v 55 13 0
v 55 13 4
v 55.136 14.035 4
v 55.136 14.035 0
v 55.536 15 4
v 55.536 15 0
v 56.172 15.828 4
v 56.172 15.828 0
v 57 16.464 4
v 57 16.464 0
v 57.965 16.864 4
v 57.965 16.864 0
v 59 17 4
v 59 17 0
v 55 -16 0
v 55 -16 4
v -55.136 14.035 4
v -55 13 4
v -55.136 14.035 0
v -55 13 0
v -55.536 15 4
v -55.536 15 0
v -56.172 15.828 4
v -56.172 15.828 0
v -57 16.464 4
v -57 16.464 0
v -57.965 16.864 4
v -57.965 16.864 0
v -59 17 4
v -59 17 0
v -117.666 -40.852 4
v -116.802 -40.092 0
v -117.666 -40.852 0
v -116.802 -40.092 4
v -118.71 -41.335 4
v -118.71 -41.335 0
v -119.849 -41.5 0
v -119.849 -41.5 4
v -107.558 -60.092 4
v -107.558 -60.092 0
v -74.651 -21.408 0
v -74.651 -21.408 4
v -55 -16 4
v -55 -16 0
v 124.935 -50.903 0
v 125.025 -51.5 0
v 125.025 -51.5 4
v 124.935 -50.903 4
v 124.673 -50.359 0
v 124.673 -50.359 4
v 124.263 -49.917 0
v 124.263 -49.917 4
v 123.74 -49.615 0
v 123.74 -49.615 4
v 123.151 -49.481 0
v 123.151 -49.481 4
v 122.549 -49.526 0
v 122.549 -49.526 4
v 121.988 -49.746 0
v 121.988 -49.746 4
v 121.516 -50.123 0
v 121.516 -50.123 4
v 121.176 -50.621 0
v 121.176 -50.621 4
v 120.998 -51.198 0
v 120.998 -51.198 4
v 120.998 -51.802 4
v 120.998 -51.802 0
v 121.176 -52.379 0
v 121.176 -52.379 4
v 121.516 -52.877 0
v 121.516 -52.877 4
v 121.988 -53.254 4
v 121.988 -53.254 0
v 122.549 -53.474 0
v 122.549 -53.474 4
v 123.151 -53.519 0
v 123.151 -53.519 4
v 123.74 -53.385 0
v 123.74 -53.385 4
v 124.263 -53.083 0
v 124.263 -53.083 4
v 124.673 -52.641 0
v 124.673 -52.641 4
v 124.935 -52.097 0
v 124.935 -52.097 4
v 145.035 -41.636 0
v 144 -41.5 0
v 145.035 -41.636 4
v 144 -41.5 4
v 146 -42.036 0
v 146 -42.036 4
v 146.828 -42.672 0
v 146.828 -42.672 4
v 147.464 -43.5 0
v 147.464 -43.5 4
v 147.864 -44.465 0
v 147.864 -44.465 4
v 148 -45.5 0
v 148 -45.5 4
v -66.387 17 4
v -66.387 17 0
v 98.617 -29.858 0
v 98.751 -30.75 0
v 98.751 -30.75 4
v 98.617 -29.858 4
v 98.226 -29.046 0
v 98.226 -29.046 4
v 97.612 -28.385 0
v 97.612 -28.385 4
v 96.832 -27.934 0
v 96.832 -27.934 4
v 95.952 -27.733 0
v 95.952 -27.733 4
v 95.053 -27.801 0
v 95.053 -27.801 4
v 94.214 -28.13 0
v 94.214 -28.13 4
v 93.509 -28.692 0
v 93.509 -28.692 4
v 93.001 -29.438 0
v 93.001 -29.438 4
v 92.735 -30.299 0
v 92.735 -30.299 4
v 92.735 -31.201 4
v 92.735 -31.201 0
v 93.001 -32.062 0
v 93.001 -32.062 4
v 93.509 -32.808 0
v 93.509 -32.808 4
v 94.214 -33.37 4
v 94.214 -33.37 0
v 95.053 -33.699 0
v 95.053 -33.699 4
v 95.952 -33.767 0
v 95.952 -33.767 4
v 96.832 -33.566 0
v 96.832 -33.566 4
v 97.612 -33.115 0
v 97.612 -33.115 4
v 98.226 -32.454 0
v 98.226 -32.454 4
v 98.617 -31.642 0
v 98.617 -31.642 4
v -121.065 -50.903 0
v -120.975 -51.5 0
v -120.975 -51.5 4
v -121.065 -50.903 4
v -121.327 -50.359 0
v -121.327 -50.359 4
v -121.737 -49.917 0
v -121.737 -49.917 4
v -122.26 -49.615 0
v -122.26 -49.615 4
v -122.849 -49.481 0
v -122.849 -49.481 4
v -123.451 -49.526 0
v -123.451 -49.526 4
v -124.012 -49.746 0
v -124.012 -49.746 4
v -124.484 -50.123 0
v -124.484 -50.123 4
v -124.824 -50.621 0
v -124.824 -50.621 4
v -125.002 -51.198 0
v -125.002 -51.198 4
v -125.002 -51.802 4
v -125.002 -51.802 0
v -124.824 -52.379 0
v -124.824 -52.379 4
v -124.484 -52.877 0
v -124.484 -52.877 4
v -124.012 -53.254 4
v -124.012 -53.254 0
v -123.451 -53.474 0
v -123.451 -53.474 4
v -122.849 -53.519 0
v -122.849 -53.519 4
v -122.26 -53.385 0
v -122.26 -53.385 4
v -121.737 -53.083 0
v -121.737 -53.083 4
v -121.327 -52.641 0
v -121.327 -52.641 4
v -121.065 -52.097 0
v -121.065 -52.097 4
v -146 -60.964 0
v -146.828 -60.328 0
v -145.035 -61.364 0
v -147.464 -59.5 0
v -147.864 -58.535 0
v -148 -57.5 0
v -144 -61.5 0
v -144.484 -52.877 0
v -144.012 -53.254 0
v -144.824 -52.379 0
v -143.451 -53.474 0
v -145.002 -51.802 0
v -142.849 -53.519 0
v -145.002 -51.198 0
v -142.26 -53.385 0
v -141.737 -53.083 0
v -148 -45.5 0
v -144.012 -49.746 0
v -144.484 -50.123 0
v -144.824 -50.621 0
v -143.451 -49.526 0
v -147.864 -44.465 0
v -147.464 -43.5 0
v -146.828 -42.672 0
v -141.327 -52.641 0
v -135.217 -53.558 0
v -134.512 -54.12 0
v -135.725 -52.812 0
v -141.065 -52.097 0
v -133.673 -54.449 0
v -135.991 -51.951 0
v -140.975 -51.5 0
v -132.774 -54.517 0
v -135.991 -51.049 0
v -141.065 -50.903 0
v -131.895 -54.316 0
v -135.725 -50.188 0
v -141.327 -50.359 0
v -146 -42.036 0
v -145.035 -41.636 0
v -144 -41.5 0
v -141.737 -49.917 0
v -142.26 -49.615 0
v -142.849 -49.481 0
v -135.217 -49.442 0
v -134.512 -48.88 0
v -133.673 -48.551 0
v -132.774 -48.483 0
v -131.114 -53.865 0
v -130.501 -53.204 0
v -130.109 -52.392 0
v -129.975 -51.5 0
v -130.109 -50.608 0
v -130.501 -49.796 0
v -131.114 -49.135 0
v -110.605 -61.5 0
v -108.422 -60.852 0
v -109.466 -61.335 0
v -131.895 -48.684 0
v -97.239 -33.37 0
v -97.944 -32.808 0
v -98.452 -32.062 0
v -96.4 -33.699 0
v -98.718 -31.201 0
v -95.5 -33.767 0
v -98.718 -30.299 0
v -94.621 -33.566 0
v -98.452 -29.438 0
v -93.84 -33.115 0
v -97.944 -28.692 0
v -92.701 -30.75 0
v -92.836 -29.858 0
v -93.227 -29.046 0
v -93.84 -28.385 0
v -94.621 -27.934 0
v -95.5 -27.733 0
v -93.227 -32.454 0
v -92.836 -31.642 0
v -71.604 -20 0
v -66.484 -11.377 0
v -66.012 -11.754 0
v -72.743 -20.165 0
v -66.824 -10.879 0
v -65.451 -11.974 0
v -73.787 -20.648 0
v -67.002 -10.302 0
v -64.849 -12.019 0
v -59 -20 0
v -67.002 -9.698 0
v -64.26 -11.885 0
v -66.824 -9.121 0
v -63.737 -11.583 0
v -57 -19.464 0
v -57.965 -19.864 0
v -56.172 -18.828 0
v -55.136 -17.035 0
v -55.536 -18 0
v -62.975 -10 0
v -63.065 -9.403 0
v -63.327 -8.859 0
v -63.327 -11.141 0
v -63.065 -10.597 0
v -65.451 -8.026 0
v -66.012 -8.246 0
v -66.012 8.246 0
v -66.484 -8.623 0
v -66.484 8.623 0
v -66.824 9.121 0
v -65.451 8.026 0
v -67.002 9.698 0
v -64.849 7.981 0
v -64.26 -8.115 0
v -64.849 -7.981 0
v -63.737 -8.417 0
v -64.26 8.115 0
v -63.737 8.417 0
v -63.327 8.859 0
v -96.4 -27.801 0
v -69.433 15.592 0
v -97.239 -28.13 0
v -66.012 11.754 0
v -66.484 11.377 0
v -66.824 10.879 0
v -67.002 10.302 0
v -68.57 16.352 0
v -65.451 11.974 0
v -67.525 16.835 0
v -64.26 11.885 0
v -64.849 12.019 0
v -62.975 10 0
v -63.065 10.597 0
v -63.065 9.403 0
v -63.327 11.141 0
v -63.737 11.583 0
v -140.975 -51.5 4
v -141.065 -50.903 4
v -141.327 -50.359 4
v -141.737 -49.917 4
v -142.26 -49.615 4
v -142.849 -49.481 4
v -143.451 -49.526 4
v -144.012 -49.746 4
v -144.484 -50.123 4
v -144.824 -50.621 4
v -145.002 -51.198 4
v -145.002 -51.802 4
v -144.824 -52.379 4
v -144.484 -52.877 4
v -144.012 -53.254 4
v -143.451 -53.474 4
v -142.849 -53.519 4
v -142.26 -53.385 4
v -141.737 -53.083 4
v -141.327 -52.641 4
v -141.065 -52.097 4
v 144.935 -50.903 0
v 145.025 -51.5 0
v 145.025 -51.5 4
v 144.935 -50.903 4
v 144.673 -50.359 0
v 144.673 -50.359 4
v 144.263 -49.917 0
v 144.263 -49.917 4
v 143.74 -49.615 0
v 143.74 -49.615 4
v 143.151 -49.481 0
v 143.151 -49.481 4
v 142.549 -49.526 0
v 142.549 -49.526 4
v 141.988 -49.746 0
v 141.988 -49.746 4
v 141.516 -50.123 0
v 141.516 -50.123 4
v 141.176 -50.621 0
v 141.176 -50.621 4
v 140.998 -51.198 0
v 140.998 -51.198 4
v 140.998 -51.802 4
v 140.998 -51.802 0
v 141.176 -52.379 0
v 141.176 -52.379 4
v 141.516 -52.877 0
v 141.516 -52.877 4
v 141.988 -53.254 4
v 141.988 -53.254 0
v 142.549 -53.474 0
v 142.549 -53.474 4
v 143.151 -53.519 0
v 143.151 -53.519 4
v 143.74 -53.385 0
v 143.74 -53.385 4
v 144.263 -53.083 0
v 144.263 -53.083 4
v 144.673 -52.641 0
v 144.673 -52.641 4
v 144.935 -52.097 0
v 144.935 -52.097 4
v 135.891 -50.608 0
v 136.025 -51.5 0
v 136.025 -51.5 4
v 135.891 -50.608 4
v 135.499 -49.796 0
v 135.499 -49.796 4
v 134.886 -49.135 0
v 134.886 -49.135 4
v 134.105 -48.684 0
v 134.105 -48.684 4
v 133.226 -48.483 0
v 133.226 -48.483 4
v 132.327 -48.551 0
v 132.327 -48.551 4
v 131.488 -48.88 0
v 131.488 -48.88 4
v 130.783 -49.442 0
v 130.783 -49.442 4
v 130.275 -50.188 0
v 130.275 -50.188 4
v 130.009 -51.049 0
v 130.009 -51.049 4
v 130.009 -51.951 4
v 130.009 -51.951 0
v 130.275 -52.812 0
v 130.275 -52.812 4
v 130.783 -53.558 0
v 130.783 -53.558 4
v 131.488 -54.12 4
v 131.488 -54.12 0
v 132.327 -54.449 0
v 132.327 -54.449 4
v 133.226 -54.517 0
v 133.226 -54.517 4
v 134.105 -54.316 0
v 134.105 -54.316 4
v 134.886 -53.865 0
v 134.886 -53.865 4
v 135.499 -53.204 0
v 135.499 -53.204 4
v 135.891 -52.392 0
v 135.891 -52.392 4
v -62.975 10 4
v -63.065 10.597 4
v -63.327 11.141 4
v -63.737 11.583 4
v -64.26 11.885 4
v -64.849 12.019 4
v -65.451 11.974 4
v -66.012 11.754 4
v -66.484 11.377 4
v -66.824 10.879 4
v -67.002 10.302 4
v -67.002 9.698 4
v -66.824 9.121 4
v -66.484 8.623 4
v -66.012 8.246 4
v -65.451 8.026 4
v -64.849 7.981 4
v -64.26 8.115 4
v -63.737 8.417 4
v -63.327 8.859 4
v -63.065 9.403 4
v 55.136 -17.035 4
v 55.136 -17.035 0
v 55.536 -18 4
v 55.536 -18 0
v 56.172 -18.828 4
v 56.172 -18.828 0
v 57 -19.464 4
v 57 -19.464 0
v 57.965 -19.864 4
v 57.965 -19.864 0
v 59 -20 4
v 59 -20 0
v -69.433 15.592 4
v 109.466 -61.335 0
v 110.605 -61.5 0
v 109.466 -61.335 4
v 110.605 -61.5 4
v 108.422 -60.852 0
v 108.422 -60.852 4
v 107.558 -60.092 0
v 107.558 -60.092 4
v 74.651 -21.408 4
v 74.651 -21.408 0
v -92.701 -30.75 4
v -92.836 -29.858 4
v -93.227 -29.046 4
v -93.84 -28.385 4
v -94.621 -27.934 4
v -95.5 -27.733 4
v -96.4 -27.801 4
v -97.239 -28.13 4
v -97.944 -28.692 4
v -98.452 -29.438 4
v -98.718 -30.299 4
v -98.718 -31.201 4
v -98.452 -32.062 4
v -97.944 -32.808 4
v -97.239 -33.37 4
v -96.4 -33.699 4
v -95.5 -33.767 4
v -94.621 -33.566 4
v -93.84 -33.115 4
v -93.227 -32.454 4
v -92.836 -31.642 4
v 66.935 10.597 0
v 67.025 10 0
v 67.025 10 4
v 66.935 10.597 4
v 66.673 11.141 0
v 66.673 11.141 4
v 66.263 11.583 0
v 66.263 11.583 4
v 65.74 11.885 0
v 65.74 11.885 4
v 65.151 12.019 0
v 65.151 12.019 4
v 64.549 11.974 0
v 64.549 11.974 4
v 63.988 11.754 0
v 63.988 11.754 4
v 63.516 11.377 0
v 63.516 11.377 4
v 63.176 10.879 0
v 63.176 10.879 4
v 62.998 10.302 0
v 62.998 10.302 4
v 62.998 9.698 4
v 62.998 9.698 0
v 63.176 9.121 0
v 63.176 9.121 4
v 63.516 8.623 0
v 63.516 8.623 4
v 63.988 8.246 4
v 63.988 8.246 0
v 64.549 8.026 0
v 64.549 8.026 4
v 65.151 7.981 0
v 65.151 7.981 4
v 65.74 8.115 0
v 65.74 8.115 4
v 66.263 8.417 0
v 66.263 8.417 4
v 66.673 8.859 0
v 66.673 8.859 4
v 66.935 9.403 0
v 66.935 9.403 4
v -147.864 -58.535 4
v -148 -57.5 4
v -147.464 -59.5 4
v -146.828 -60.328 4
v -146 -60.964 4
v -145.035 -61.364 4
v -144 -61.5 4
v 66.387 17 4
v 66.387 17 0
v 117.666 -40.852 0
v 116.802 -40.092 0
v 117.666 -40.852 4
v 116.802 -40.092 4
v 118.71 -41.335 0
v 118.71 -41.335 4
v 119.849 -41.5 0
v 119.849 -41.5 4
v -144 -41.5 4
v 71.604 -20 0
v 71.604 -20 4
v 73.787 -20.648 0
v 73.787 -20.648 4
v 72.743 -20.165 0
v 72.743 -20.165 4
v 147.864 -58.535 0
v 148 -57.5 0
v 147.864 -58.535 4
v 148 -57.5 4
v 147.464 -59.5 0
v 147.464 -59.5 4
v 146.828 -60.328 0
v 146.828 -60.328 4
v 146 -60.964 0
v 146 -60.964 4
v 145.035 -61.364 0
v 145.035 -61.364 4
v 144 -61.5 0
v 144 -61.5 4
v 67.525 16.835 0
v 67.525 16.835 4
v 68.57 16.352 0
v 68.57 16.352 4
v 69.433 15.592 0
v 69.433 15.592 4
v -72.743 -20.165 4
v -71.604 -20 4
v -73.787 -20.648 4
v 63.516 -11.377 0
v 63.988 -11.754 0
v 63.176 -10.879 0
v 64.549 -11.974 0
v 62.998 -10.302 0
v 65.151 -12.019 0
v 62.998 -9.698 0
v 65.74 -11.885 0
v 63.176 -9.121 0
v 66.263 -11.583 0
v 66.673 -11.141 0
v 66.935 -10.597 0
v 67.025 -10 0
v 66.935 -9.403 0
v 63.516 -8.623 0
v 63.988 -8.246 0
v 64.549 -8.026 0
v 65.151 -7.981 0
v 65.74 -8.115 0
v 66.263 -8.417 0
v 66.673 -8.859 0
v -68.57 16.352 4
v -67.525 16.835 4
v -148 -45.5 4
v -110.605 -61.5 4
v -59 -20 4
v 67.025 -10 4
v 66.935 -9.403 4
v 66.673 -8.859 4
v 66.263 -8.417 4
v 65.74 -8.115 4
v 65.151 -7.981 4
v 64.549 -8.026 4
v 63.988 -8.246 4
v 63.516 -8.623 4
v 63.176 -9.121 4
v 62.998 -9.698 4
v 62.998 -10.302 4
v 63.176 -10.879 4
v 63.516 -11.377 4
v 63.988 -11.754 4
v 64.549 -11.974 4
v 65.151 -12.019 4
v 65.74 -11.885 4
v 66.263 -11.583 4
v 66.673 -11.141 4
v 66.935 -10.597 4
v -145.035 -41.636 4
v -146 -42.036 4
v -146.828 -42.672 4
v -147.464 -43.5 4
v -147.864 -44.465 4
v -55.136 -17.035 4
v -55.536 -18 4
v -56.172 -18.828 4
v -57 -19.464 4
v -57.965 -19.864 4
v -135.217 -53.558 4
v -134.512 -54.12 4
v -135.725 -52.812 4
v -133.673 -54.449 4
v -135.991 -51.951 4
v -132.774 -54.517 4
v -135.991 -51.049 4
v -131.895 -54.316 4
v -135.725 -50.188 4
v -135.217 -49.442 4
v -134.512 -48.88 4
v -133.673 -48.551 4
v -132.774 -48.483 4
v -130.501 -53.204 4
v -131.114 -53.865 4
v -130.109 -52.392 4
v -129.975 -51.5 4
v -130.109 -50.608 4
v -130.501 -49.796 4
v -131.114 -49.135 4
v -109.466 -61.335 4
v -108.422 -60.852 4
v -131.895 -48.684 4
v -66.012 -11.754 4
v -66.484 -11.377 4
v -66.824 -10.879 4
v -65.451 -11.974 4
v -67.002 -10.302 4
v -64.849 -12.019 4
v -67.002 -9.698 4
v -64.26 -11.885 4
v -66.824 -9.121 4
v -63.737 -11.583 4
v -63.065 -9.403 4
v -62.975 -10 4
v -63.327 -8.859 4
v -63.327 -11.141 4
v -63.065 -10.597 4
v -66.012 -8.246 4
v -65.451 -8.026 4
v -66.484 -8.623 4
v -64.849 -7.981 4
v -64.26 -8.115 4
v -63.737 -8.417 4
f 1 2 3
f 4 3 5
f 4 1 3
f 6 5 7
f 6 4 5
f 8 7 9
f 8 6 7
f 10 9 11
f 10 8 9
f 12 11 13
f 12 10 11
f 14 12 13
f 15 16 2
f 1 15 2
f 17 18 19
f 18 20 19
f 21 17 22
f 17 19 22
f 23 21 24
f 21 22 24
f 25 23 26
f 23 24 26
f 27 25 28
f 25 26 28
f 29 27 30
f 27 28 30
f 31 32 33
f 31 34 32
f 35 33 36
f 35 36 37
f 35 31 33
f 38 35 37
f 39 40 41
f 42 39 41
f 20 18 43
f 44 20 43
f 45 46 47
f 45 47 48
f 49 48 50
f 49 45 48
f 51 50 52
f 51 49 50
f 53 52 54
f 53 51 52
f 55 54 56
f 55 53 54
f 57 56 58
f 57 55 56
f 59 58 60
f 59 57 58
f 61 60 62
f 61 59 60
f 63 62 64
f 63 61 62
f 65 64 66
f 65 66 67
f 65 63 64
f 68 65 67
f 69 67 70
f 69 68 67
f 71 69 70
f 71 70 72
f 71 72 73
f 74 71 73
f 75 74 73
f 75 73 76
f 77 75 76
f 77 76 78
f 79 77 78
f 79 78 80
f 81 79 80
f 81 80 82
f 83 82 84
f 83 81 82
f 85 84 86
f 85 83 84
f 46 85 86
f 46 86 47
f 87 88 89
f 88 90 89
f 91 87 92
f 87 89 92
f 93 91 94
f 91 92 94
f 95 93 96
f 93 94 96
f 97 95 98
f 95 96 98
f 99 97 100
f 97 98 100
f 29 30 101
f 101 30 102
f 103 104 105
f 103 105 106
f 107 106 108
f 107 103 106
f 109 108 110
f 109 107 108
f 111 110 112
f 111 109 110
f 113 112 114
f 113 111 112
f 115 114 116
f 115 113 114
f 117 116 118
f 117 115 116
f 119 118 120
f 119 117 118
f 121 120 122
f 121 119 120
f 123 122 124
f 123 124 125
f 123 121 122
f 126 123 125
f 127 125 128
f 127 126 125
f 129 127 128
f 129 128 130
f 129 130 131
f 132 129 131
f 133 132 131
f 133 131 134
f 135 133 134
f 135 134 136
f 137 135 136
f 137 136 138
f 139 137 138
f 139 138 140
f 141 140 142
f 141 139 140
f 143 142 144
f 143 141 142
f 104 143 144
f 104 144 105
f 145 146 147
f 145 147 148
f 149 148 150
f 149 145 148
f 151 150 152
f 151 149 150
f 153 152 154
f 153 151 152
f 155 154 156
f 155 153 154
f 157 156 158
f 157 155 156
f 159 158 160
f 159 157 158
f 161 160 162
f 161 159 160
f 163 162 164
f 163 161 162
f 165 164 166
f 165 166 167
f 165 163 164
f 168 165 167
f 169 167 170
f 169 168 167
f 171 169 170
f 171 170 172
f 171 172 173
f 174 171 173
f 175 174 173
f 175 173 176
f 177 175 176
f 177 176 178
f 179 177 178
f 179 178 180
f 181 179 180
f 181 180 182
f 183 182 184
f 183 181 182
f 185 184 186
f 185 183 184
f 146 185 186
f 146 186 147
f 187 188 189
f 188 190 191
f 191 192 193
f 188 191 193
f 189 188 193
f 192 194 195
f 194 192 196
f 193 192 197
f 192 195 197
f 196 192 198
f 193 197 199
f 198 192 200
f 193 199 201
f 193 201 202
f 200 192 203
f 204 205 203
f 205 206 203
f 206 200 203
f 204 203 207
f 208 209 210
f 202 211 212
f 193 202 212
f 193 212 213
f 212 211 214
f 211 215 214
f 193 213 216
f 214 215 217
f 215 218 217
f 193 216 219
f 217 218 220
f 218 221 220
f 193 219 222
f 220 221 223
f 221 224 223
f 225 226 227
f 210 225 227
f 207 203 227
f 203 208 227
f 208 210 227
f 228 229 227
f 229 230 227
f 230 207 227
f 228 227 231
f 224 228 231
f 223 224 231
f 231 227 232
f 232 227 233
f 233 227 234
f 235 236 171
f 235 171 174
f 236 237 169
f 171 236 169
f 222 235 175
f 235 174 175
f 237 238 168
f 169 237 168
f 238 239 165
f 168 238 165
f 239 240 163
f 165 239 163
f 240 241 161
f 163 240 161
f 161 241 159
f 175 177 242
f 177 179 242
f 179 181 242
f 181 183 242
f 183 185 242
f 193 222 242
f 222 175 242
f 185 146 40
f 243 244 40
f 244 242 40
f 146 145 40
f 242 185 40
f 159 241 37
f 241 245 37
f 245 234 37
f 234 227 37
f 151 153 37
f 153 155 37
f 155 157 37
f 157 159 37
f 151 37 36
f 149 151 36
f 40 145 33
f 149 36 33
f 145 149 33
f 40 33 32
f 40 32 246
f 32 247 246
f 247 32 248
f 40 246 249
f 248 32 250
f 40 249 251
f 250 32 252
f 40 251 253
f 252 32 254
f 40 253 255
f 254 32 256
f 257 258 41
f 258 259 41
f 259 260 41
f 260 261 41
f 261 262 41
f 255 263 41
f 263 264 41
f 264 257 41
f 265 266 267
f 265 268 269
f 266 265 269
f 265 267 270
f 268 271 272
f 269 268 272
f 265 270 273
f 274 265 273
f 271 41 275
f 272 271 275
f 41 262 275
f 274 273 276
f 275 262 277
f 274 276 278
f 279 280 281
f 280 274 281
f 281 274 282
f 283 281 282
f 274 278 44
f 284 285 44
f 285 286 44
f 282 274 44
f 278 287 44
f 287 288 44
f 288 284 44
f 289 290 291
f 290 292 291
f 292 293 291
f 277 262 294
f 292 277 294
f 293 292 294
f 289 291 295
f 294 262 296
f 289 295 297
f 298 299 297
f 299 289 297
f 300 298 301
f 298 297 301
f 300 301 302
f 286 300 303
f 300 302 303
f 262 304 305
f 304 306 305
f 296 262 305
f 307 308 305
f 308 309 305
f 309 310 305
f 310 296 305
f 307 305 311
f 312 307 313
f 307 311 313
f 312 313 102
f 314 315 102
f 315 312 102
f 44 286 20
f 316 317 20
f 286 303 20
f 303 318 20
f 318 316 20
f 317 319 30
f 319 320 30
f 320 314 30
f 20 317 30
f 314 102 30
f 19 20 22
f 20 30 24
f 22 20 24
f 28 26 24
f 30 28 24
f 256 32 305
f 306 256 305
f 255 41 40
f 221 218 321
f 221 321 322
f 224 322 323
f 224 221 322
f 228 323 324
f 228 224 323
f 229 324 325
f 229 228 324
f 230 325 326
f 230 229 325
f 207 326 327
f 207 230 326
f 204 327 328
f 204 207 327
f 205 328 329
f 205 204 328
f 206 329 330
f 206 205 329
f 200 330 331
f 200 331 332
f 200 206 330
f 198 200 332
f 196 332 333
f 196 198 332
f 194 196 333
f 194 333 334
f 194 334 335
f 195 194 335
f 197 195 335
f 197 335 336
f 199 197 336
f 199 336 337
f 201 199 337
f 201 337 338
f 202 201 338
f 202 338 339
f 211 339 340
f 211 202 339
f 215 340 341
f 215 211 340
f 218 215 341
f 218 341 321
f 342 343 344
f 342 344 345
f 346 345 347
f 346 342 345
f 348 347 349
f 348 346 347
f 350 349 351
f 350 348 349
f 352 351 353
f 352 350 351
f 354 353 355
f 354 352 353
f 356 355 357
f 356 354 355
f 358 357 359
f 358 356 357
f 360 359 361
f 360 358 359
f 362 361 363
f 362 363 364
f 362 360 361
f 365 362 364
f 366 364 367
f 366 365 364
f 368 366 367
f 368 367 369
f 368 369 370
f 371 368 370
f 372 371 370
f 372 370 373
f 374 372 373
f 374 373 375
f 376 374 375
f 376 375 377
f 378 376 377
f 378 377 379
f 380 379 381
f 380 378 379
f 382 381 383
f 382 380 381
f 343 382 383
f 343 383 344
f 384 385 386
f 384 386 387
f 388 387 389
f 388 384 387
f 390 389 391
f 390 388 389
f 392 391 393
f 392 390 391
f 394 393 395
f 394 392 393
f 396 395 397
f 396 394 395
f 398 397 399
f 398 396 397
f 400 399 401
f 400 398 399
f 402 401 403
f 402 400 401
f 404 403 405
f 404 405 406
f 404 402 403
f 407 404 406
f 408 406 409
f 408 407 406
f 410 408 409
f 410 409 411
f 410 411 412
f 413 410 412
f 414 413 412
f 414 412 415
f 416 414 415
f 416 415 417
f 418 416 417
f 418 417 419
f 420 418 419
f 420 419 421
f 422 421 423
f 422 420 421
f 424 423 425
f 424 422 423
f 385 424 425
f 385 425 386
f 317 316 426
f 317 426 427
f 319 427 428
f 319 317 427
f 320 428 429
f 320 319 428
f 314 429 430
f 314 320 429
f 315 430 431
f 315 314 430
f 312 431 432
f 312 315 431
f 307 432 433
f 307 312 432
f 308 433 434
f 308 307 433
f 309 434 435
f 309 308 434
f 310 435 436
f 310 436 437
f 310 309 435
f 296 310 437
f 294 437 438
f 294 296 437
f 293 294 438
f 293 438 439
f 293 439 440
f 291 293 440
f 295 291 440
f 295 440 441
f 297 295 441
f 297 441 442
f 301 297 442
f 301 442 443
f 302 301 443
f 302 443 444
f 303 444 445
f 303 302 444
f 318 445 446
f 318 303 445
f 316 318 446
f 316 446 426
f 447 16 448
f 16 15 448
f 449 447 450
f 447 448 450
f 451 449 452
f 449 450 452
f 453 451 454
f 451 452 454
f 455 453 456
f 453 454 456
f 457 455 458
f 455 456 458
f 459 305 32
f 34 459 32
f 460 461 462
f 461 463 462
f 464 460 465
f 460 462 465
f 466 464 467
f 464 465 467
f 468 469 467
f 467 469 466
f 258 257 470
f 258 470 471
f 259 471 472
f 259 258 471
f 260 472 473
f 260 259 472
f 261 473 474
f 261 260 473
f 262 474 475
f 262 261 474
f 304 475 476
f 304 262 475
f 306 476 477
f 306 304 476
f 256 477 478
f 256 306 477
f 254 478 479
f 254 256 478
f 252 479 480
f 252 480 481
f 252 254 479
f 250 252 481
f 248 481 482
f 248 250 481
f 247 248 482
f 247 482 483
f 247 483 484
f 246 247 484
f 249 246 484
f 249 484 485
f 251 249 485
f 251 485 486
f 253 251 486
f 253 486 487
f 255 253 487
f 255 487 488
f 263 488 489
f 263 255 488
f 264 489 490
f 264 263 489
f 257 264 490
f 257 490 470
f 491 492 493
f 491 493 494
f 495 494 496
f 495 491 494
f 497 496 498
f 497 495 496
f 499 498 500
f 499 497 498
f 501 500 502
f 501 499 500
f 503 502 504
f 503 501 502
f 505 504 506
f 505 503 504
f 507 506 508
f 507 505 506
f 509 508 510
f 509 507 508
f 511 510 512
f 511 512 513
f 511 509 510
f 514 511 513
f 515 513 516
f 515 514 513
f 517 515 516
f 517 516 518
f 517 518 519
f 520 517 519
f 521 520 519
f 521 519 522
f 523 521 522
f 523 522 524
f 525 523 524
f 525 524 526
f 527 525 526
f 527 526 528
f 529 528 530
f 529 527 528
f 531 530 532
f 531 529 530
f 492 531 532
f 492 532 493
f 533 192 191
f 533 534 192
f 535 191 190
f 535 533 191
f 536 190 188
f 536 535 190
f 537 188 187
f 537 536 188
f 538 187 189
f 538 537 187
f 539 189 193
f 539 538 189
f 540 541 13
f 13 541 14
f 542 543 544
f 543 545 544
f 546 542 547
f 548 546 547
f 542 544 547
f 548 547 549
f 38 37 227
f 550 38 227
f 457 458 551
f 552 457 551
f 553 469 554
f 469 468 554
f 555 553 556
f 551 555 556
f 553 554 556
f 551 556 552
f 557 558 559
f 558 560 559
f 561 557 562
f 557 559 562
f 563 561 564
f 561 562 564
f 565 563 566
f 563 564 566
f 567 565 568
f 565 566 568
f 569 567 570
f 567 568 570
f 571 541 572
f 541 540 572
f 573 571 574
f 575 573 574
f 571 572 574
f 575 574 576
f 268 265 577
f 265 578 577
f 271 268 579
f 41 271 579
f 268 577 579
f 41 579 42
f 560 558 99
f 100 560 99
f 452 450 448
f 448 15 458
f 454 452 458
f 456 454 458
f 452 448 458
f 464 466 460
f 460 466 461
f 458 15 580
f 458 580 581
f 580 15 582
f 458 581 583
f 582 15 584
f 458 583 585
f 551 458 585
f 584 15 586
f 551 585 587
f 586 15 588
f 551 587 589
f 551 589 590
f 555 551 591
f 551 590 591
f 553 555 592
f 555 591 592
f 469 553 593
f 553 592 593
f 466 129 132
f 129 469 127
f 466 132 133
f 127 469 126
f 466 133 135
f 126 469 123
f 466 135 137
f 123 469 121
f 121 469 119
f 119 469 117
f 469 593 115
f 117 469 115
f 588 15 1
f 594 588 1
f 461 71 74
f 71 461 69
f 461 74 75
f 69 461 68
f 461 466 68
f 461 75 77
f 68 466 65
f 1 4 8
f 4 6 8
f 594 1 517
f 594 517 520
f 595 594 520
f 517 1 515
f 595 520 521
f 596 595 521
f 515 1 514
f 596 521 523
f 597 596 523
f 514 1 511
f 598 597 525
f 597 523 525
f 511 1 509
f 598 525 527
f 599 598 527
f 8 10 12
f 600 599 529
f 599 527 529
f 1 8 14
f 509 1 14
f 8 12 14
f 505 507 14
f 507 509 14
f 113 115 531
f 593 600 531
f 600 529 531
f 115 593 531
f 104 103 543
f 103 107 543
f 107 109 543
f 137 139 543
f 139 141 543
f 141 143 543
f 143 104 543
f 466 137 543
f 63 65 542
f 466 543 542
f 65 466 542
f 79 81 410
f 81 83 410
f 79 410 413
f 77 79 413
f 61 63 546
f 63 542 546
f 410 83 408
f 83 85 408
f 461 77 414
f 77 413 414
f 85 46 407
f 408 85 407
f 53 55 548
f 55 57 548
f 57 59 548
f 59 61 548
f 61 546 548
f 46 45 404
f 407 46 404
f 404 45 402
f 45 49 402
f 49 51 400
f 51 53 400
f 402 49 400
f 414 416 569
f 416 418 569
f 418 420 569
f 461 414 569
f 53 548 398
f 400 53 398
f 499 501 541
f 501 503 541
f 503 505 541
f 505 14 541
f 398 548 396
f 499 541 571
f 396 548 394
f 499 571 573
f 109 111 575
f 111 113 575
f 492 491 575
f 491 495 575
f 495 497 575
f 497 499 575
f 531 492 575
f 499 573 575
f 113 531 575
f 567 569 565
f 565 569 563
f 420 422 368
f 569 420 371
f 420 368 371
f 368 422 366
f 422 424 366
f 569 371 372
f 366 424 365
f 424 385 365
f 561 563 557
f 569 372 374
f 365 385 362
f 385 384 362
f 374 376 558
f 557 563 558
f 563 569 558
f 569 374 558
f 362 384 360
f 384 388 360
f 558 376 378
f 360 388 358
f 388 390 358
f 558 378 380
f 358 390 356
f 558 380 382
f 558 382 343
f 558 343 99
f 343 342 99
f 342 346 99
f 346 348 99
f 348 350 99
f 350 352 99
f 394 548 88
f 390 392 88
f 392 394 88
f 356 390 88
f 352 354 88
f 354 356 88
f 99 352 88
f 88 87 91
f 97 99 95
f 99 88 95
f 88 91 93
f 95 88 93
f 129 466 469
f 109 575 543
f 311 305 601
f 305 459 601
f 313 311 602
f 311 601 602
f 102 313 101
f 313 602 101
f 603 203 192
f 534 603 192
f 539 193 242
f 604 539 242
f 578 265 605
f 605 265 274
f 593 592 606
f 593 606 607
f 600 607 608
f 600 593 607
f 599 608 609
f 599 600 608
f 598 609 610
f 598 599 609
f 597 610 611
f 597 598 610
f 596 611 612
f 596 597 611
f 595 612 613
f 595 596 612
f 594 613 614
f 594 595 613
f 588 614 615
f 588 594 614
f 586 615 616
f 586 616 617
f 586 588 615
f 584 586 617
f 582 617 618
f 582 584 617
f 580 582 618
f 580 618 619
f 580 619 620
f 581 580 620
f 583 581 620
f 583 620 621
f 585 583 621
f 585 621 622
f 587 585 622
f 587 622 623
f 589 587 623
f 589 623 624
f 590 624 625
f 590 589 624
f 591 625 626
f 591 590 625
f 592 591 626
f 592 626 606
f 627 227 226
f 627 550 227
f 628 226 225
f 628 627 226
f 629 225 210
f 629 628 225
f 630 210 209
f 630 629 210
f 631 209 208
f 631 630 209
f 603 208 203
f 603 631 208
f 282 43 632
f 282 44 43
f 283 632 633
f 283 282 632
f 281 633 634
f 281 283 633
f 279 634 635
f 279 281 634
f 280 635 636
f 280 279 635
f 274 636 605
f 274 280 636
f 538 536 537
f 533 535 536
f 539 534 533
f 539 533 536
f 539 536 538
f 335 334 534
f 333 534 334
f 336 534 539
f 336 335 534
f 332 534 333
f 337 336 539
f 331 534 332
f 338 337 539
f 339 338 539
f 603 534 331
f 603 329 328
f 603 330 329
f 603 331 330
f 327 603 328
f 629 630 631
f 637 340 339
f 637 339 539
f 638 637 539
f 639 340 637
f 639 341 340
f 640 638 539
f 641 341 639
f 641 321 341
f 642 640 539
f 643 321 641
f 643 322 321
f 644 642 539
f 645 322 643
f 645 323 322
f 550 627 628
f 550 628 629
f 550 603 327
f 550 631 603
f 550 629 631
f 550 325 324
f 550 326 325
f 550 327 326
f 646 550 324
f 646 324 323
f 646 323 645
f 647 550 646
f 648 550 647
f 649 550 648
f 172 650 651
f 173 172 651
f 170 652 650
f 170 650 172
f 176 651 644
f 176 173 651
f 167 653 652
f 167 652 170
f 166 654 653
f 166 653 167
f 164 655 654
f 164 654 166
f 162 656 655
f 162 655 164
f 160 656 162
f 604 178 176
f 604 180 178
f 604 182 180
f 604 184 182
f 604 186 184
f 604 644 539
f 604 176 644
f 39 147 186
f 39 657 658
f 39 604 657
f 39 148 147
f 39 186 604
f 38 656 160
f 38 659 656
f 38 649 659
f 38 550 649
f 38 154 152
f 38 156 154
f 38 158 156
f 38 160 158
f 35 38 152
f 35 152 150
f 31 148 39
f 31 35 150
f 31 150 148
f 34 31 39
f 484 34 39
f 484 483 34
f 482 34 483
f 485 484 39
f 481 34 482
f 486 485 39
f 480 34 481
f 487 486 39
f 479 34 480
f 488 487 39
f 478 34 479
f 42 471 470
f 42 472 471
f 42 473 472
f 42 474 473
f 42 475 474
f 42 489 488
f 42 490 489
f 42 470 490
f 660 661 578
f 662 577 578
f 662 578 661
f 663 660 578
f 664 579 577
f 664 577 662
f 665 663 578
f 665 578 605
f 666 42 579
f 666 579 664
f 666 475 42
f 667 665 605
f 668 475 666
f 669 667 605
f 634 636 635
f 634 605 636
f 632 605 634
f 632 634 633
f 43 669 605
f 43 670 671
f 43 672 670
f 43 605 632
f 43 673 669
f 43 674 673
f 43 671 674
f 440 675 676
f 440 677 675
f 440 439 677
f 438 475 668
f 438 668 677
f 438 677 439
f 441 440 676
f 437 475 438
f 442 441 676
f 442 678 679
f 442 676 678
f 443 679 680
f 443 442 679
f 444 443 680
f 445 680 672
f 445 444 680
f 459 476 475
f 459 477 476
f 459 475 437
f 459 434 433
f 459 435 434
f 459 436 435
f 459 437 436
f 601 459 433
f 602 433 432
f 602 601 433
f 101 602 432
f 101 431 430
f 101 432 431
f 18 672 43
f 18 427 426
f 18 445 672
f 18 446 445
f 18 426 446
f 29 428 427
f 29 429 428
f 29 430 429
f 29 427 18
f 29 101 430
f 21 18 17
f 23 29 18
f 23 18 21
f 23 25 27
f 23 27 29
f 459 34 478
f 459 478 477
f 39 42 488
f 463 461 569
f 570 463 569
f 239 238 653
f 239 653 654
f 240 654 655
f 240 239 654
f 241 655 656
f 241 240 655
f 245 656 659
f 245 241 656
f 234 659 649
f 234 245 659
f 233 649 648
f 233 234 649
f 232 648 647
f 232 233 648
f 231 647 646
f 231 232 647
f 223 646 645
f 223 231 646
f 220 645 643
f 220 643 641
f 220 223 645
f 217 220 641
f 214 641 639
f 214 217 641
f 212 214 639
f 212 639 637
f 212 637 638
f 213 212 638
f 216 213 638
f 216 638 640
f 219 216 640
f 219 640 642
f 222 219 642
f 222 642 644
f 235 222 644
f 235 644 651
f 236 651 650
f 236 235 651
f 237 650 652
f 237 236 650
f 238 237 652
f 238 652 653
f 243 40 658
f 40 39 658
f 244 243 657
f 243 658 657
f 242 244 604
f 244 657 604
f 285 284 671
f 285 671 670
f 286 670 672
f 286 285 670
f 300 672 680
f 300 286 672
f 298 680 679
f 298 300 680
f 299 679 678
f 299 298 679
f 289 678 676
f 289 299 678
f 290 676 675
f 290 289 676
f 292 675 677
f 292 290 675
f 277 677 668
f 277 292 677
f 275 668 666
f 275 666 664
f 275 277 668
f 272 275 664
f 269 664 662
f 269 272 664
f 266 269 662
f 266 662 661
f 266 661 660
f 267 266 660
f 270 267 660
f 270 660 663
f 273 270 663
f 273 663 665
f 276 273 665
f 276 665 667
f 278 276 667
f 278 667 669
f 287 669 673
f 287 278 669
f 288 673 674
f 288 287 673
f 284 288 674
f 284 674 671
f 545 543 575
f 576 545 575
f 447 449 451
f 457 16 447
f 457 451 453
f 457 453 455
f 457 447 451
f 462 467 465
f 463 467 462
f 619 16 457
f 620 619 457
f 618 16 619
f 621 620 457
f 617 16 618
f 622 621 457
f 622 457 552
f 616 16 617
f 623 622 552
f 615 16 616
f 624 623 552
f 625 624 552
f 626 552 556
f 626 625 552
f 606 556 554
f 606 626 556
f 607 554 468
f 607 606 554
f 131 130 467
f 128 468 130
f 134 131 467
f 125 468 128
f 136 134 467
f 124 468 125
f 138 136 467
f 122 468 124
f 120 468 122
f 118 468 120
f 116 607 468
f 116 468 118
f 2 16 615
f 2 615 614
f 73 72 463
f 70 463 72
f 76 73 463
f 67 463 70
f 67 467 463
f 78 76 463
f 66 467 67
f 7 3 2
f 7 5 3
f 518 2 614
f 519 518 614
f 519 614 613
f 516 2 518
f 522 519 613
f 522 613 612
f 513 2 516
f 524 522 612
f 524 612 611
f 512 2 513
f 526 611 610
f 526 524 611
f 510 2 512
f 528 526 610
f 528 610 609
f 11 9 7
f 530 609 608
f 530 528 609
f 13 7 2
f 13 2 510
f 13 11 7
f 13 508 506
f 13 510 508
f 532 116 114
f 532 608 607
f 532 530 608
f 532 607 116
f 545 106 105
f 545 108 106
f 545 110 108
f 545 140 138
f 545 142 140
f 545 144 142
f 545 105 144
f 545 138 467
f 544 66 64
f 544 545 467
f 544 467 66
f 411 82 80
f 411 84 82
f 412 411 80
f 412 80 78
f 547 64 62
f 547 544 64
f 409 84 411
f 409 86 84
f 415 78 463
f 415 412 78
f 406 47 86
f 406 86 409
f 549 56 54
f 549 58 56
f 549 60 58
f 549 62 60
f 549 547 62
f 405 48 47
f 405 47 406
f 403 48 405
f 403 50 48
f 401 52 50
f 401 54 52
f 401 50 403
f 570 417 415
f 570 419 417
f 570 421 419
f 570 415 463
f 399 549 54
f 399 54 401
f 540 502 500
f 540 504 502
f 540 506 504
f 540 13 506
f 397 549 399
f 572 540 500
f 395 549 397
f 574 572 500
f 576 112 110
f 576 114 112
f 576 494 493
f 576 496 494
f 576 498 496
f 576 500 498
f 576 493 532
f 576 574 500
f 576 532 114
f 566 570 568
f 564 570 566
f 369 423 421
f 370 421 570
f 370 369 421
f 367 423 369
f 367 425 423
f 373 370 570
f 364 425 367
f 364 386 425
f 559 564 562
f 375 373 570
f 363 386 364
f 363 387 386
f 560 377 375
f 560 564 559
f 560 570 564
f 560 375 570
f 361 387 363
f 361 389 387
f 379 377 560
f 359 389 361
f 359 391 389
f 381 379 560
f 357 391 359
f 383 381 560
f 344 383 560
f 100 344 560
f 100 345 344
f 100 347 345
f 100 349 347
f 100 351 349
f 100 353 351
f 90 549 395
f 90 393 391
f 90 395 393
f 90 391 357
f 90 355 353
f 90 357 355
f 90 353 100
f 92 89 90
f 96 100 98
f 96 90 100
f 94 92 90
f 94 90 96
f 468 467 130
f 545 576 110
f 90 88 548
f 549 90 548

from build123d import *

# Parameters (mm, degrees)
SKETCH_1_R          = 3.025
SKETCH_1_R_2        = 2.025
EXTRUDE_1_DEPTH     = 4
SKETCH_2_W          = 79
SKETCH_2_H          = 36
CUT_EXTRUDE_1_DEPTH = 4
FILLET_1_R          = 4
SKETCH_3_W          = 110
SKETCH_3_H          = 3
SKETCH_3_H_2        = 34
CUT_EXTRUDE_2_DEPTH = 10
FILLET_2_R          = 4
FILLET_3_R          = 4


with BuildPart() as part:
    # 草图1 → 凸台-拉伸1 (new body)
    with BuildSketch(Plane.XY):
        with BuildLine():
            Line((-68.235415063, 17), (-118, -41.5))
            Line((-118, -41.5), (-148, -41.5))
            Line((-148, -41.5), (-148, -61.5))
            Line((-148, -61.5), (-108.755956962, -61.5))
            Line((-108.755956962, -61.5), (-73.45287534, -20))
            Line((-73.45287534, -20), (73.45287534, -20))
            Line((73.45287534, -20), (108.755956962, -61.5))
            Line((108.755956962, -61.5), (148, -61.5))
            Line((148, -61.5), (148, -41.5))
            Line((148, -41.5), (118, -41.5))
            Line((118, -41.5), (68.235415063, 17))
            Line((68.235415063, 17), (49.462300945, 17))
            ThreePointArc((49.462300945, 17), (47.5, 14.475), (45.537699055, 17))
            Line((45.537699055, 17), (-45.537699055, 17))
            ThreePointArc((-45.537699055, 17), (-47.5, 14.475), (-49.462300945, 17))
            Line((-49.462300945, 17), (-68.235415063, 17))
        make_face()
        with Locations((-95.72643767, -30.75)):
            Circle(SKETCH_1_R, mode=Mode.SUBTRACT)
        with Locations((95.72643767, -30.75)):
            Circle(SKETCH_1_R, mode=Mode.SUBTRACT)
        with Locations((-65, -10)):
            Circle(SKETCH_1_R_2, mode=Mode.SUBTRACT)
        with Locations((-47.5, -8.5)):
            Circle(SKETCH_1_R_2, mode=Mode.SUBTRACT)
        with Locations((-65, 10)):
            Circle(SKETCH_1_R_2, mode=Mode.SUBTRACT)
        with Locations((47.5, -8.5)):
            Circle(SKETCH_1_R_2, mode=Mode.SUBTRACT)
        with Locations((65, -10)):
            Circle(SKETCH_1_R_2, mode=Mode.SUBTRACT)
        with Locations((65, 10)):
            Circle(SKETCH_1_R_2, mode=Mode.SUBTRACT)
        with Locations((-123, -51.5)):
            Circle(SKETCH_1_R_2, mode=Mode.SUBTRACT)
        with Locations((-143, -51.5)):
            Circle(SKETCH_1_R_2, mode=Mode.SUBTRACT)
        with Locations((-133, -51.5)):
            Circle(SKETCH_1_R, mode=Mode.SUBTRACT)
        with Locations((143, -51.5)):
            Circle(SKETCH_1_R_2, mode=Mode.SUBTRACT)
        with Locations((123, -51.5)):
            Circle(SKETCH_1_R_2, mode=Mode.SUBTRACT)
        with Locations((133, -51.5)):
            Circle(SKETCH_1_R, mode=Mode.SUBTRACT)
    extrude(amount=EXTRUDE_1_DEPTH)

    # 草图2 → 切除-拉伸1 (cut)
    with BuildSketch(Plane.XY.offset(4)):
        with Locations((0, 4)):
            Rectangle(SKETCH_2_W, SKETCH_2_H)
    extrude(amount=-CUT_EXTRUDE_1_DEPTH, mode=Mode.SUBTRACT)

    # 圆角1
    fillet_1_edges = [part.edges().sort_by_distance(p)[0] for p in [
        (39.5, -14, 2),
        (-39.5, -14, 2),
        (-148, -61.5, 2),
        (-148, -41.5, 2),
        (-118, -41.5, 2),
        (-68.235415063, 17, 2),
        (68.235415063, 17, 2),
        (118, -41.5, 2),
        (148, -41.5, 2),
        (148, -61.5, 2),
        (108.755956962, -61.5, 2),
        (73.45287534, -20, 2),
        (-73.45287534, -20, 2),
        (-108.755956962, -61.5, 2),
    ]]
    fillet(fillet_1_edges, radius=FILLET_1_R)

    # 草图3 → 切除-拉伸2 (cut)
    with BuildSketch(Plane.XY.offset(4)):
        with Locations((0, -18.5)):
            Rectangle(SKETCH_3_W, SKETCH_3_H)
        Rectangle(SKETCH_3_W, SKETCH_3_H_2)
    extrude(amount=-CUT_EXTRUDE_2_DEPTH, mode=Mode.SUBTRACT)

    # 圆角2
    fillet_2_edges = [part.edges().sort_by_distance(p)[0] for p in [
        (-55, -20, 2),
        (-55, 17, 2),
    ]]
    fillet(fillet_2_edges, radius=FILLET_2_R)

    # 圆角3
    fillet_3_edges = [part.edges().sort_by_distance(p)[0] for p in [
        (55, 17, 2),
        (55, -20, 2),
    ]]
    fillet(fillet_3_edges, radius=FILLET_3_R)


solid = part.part
